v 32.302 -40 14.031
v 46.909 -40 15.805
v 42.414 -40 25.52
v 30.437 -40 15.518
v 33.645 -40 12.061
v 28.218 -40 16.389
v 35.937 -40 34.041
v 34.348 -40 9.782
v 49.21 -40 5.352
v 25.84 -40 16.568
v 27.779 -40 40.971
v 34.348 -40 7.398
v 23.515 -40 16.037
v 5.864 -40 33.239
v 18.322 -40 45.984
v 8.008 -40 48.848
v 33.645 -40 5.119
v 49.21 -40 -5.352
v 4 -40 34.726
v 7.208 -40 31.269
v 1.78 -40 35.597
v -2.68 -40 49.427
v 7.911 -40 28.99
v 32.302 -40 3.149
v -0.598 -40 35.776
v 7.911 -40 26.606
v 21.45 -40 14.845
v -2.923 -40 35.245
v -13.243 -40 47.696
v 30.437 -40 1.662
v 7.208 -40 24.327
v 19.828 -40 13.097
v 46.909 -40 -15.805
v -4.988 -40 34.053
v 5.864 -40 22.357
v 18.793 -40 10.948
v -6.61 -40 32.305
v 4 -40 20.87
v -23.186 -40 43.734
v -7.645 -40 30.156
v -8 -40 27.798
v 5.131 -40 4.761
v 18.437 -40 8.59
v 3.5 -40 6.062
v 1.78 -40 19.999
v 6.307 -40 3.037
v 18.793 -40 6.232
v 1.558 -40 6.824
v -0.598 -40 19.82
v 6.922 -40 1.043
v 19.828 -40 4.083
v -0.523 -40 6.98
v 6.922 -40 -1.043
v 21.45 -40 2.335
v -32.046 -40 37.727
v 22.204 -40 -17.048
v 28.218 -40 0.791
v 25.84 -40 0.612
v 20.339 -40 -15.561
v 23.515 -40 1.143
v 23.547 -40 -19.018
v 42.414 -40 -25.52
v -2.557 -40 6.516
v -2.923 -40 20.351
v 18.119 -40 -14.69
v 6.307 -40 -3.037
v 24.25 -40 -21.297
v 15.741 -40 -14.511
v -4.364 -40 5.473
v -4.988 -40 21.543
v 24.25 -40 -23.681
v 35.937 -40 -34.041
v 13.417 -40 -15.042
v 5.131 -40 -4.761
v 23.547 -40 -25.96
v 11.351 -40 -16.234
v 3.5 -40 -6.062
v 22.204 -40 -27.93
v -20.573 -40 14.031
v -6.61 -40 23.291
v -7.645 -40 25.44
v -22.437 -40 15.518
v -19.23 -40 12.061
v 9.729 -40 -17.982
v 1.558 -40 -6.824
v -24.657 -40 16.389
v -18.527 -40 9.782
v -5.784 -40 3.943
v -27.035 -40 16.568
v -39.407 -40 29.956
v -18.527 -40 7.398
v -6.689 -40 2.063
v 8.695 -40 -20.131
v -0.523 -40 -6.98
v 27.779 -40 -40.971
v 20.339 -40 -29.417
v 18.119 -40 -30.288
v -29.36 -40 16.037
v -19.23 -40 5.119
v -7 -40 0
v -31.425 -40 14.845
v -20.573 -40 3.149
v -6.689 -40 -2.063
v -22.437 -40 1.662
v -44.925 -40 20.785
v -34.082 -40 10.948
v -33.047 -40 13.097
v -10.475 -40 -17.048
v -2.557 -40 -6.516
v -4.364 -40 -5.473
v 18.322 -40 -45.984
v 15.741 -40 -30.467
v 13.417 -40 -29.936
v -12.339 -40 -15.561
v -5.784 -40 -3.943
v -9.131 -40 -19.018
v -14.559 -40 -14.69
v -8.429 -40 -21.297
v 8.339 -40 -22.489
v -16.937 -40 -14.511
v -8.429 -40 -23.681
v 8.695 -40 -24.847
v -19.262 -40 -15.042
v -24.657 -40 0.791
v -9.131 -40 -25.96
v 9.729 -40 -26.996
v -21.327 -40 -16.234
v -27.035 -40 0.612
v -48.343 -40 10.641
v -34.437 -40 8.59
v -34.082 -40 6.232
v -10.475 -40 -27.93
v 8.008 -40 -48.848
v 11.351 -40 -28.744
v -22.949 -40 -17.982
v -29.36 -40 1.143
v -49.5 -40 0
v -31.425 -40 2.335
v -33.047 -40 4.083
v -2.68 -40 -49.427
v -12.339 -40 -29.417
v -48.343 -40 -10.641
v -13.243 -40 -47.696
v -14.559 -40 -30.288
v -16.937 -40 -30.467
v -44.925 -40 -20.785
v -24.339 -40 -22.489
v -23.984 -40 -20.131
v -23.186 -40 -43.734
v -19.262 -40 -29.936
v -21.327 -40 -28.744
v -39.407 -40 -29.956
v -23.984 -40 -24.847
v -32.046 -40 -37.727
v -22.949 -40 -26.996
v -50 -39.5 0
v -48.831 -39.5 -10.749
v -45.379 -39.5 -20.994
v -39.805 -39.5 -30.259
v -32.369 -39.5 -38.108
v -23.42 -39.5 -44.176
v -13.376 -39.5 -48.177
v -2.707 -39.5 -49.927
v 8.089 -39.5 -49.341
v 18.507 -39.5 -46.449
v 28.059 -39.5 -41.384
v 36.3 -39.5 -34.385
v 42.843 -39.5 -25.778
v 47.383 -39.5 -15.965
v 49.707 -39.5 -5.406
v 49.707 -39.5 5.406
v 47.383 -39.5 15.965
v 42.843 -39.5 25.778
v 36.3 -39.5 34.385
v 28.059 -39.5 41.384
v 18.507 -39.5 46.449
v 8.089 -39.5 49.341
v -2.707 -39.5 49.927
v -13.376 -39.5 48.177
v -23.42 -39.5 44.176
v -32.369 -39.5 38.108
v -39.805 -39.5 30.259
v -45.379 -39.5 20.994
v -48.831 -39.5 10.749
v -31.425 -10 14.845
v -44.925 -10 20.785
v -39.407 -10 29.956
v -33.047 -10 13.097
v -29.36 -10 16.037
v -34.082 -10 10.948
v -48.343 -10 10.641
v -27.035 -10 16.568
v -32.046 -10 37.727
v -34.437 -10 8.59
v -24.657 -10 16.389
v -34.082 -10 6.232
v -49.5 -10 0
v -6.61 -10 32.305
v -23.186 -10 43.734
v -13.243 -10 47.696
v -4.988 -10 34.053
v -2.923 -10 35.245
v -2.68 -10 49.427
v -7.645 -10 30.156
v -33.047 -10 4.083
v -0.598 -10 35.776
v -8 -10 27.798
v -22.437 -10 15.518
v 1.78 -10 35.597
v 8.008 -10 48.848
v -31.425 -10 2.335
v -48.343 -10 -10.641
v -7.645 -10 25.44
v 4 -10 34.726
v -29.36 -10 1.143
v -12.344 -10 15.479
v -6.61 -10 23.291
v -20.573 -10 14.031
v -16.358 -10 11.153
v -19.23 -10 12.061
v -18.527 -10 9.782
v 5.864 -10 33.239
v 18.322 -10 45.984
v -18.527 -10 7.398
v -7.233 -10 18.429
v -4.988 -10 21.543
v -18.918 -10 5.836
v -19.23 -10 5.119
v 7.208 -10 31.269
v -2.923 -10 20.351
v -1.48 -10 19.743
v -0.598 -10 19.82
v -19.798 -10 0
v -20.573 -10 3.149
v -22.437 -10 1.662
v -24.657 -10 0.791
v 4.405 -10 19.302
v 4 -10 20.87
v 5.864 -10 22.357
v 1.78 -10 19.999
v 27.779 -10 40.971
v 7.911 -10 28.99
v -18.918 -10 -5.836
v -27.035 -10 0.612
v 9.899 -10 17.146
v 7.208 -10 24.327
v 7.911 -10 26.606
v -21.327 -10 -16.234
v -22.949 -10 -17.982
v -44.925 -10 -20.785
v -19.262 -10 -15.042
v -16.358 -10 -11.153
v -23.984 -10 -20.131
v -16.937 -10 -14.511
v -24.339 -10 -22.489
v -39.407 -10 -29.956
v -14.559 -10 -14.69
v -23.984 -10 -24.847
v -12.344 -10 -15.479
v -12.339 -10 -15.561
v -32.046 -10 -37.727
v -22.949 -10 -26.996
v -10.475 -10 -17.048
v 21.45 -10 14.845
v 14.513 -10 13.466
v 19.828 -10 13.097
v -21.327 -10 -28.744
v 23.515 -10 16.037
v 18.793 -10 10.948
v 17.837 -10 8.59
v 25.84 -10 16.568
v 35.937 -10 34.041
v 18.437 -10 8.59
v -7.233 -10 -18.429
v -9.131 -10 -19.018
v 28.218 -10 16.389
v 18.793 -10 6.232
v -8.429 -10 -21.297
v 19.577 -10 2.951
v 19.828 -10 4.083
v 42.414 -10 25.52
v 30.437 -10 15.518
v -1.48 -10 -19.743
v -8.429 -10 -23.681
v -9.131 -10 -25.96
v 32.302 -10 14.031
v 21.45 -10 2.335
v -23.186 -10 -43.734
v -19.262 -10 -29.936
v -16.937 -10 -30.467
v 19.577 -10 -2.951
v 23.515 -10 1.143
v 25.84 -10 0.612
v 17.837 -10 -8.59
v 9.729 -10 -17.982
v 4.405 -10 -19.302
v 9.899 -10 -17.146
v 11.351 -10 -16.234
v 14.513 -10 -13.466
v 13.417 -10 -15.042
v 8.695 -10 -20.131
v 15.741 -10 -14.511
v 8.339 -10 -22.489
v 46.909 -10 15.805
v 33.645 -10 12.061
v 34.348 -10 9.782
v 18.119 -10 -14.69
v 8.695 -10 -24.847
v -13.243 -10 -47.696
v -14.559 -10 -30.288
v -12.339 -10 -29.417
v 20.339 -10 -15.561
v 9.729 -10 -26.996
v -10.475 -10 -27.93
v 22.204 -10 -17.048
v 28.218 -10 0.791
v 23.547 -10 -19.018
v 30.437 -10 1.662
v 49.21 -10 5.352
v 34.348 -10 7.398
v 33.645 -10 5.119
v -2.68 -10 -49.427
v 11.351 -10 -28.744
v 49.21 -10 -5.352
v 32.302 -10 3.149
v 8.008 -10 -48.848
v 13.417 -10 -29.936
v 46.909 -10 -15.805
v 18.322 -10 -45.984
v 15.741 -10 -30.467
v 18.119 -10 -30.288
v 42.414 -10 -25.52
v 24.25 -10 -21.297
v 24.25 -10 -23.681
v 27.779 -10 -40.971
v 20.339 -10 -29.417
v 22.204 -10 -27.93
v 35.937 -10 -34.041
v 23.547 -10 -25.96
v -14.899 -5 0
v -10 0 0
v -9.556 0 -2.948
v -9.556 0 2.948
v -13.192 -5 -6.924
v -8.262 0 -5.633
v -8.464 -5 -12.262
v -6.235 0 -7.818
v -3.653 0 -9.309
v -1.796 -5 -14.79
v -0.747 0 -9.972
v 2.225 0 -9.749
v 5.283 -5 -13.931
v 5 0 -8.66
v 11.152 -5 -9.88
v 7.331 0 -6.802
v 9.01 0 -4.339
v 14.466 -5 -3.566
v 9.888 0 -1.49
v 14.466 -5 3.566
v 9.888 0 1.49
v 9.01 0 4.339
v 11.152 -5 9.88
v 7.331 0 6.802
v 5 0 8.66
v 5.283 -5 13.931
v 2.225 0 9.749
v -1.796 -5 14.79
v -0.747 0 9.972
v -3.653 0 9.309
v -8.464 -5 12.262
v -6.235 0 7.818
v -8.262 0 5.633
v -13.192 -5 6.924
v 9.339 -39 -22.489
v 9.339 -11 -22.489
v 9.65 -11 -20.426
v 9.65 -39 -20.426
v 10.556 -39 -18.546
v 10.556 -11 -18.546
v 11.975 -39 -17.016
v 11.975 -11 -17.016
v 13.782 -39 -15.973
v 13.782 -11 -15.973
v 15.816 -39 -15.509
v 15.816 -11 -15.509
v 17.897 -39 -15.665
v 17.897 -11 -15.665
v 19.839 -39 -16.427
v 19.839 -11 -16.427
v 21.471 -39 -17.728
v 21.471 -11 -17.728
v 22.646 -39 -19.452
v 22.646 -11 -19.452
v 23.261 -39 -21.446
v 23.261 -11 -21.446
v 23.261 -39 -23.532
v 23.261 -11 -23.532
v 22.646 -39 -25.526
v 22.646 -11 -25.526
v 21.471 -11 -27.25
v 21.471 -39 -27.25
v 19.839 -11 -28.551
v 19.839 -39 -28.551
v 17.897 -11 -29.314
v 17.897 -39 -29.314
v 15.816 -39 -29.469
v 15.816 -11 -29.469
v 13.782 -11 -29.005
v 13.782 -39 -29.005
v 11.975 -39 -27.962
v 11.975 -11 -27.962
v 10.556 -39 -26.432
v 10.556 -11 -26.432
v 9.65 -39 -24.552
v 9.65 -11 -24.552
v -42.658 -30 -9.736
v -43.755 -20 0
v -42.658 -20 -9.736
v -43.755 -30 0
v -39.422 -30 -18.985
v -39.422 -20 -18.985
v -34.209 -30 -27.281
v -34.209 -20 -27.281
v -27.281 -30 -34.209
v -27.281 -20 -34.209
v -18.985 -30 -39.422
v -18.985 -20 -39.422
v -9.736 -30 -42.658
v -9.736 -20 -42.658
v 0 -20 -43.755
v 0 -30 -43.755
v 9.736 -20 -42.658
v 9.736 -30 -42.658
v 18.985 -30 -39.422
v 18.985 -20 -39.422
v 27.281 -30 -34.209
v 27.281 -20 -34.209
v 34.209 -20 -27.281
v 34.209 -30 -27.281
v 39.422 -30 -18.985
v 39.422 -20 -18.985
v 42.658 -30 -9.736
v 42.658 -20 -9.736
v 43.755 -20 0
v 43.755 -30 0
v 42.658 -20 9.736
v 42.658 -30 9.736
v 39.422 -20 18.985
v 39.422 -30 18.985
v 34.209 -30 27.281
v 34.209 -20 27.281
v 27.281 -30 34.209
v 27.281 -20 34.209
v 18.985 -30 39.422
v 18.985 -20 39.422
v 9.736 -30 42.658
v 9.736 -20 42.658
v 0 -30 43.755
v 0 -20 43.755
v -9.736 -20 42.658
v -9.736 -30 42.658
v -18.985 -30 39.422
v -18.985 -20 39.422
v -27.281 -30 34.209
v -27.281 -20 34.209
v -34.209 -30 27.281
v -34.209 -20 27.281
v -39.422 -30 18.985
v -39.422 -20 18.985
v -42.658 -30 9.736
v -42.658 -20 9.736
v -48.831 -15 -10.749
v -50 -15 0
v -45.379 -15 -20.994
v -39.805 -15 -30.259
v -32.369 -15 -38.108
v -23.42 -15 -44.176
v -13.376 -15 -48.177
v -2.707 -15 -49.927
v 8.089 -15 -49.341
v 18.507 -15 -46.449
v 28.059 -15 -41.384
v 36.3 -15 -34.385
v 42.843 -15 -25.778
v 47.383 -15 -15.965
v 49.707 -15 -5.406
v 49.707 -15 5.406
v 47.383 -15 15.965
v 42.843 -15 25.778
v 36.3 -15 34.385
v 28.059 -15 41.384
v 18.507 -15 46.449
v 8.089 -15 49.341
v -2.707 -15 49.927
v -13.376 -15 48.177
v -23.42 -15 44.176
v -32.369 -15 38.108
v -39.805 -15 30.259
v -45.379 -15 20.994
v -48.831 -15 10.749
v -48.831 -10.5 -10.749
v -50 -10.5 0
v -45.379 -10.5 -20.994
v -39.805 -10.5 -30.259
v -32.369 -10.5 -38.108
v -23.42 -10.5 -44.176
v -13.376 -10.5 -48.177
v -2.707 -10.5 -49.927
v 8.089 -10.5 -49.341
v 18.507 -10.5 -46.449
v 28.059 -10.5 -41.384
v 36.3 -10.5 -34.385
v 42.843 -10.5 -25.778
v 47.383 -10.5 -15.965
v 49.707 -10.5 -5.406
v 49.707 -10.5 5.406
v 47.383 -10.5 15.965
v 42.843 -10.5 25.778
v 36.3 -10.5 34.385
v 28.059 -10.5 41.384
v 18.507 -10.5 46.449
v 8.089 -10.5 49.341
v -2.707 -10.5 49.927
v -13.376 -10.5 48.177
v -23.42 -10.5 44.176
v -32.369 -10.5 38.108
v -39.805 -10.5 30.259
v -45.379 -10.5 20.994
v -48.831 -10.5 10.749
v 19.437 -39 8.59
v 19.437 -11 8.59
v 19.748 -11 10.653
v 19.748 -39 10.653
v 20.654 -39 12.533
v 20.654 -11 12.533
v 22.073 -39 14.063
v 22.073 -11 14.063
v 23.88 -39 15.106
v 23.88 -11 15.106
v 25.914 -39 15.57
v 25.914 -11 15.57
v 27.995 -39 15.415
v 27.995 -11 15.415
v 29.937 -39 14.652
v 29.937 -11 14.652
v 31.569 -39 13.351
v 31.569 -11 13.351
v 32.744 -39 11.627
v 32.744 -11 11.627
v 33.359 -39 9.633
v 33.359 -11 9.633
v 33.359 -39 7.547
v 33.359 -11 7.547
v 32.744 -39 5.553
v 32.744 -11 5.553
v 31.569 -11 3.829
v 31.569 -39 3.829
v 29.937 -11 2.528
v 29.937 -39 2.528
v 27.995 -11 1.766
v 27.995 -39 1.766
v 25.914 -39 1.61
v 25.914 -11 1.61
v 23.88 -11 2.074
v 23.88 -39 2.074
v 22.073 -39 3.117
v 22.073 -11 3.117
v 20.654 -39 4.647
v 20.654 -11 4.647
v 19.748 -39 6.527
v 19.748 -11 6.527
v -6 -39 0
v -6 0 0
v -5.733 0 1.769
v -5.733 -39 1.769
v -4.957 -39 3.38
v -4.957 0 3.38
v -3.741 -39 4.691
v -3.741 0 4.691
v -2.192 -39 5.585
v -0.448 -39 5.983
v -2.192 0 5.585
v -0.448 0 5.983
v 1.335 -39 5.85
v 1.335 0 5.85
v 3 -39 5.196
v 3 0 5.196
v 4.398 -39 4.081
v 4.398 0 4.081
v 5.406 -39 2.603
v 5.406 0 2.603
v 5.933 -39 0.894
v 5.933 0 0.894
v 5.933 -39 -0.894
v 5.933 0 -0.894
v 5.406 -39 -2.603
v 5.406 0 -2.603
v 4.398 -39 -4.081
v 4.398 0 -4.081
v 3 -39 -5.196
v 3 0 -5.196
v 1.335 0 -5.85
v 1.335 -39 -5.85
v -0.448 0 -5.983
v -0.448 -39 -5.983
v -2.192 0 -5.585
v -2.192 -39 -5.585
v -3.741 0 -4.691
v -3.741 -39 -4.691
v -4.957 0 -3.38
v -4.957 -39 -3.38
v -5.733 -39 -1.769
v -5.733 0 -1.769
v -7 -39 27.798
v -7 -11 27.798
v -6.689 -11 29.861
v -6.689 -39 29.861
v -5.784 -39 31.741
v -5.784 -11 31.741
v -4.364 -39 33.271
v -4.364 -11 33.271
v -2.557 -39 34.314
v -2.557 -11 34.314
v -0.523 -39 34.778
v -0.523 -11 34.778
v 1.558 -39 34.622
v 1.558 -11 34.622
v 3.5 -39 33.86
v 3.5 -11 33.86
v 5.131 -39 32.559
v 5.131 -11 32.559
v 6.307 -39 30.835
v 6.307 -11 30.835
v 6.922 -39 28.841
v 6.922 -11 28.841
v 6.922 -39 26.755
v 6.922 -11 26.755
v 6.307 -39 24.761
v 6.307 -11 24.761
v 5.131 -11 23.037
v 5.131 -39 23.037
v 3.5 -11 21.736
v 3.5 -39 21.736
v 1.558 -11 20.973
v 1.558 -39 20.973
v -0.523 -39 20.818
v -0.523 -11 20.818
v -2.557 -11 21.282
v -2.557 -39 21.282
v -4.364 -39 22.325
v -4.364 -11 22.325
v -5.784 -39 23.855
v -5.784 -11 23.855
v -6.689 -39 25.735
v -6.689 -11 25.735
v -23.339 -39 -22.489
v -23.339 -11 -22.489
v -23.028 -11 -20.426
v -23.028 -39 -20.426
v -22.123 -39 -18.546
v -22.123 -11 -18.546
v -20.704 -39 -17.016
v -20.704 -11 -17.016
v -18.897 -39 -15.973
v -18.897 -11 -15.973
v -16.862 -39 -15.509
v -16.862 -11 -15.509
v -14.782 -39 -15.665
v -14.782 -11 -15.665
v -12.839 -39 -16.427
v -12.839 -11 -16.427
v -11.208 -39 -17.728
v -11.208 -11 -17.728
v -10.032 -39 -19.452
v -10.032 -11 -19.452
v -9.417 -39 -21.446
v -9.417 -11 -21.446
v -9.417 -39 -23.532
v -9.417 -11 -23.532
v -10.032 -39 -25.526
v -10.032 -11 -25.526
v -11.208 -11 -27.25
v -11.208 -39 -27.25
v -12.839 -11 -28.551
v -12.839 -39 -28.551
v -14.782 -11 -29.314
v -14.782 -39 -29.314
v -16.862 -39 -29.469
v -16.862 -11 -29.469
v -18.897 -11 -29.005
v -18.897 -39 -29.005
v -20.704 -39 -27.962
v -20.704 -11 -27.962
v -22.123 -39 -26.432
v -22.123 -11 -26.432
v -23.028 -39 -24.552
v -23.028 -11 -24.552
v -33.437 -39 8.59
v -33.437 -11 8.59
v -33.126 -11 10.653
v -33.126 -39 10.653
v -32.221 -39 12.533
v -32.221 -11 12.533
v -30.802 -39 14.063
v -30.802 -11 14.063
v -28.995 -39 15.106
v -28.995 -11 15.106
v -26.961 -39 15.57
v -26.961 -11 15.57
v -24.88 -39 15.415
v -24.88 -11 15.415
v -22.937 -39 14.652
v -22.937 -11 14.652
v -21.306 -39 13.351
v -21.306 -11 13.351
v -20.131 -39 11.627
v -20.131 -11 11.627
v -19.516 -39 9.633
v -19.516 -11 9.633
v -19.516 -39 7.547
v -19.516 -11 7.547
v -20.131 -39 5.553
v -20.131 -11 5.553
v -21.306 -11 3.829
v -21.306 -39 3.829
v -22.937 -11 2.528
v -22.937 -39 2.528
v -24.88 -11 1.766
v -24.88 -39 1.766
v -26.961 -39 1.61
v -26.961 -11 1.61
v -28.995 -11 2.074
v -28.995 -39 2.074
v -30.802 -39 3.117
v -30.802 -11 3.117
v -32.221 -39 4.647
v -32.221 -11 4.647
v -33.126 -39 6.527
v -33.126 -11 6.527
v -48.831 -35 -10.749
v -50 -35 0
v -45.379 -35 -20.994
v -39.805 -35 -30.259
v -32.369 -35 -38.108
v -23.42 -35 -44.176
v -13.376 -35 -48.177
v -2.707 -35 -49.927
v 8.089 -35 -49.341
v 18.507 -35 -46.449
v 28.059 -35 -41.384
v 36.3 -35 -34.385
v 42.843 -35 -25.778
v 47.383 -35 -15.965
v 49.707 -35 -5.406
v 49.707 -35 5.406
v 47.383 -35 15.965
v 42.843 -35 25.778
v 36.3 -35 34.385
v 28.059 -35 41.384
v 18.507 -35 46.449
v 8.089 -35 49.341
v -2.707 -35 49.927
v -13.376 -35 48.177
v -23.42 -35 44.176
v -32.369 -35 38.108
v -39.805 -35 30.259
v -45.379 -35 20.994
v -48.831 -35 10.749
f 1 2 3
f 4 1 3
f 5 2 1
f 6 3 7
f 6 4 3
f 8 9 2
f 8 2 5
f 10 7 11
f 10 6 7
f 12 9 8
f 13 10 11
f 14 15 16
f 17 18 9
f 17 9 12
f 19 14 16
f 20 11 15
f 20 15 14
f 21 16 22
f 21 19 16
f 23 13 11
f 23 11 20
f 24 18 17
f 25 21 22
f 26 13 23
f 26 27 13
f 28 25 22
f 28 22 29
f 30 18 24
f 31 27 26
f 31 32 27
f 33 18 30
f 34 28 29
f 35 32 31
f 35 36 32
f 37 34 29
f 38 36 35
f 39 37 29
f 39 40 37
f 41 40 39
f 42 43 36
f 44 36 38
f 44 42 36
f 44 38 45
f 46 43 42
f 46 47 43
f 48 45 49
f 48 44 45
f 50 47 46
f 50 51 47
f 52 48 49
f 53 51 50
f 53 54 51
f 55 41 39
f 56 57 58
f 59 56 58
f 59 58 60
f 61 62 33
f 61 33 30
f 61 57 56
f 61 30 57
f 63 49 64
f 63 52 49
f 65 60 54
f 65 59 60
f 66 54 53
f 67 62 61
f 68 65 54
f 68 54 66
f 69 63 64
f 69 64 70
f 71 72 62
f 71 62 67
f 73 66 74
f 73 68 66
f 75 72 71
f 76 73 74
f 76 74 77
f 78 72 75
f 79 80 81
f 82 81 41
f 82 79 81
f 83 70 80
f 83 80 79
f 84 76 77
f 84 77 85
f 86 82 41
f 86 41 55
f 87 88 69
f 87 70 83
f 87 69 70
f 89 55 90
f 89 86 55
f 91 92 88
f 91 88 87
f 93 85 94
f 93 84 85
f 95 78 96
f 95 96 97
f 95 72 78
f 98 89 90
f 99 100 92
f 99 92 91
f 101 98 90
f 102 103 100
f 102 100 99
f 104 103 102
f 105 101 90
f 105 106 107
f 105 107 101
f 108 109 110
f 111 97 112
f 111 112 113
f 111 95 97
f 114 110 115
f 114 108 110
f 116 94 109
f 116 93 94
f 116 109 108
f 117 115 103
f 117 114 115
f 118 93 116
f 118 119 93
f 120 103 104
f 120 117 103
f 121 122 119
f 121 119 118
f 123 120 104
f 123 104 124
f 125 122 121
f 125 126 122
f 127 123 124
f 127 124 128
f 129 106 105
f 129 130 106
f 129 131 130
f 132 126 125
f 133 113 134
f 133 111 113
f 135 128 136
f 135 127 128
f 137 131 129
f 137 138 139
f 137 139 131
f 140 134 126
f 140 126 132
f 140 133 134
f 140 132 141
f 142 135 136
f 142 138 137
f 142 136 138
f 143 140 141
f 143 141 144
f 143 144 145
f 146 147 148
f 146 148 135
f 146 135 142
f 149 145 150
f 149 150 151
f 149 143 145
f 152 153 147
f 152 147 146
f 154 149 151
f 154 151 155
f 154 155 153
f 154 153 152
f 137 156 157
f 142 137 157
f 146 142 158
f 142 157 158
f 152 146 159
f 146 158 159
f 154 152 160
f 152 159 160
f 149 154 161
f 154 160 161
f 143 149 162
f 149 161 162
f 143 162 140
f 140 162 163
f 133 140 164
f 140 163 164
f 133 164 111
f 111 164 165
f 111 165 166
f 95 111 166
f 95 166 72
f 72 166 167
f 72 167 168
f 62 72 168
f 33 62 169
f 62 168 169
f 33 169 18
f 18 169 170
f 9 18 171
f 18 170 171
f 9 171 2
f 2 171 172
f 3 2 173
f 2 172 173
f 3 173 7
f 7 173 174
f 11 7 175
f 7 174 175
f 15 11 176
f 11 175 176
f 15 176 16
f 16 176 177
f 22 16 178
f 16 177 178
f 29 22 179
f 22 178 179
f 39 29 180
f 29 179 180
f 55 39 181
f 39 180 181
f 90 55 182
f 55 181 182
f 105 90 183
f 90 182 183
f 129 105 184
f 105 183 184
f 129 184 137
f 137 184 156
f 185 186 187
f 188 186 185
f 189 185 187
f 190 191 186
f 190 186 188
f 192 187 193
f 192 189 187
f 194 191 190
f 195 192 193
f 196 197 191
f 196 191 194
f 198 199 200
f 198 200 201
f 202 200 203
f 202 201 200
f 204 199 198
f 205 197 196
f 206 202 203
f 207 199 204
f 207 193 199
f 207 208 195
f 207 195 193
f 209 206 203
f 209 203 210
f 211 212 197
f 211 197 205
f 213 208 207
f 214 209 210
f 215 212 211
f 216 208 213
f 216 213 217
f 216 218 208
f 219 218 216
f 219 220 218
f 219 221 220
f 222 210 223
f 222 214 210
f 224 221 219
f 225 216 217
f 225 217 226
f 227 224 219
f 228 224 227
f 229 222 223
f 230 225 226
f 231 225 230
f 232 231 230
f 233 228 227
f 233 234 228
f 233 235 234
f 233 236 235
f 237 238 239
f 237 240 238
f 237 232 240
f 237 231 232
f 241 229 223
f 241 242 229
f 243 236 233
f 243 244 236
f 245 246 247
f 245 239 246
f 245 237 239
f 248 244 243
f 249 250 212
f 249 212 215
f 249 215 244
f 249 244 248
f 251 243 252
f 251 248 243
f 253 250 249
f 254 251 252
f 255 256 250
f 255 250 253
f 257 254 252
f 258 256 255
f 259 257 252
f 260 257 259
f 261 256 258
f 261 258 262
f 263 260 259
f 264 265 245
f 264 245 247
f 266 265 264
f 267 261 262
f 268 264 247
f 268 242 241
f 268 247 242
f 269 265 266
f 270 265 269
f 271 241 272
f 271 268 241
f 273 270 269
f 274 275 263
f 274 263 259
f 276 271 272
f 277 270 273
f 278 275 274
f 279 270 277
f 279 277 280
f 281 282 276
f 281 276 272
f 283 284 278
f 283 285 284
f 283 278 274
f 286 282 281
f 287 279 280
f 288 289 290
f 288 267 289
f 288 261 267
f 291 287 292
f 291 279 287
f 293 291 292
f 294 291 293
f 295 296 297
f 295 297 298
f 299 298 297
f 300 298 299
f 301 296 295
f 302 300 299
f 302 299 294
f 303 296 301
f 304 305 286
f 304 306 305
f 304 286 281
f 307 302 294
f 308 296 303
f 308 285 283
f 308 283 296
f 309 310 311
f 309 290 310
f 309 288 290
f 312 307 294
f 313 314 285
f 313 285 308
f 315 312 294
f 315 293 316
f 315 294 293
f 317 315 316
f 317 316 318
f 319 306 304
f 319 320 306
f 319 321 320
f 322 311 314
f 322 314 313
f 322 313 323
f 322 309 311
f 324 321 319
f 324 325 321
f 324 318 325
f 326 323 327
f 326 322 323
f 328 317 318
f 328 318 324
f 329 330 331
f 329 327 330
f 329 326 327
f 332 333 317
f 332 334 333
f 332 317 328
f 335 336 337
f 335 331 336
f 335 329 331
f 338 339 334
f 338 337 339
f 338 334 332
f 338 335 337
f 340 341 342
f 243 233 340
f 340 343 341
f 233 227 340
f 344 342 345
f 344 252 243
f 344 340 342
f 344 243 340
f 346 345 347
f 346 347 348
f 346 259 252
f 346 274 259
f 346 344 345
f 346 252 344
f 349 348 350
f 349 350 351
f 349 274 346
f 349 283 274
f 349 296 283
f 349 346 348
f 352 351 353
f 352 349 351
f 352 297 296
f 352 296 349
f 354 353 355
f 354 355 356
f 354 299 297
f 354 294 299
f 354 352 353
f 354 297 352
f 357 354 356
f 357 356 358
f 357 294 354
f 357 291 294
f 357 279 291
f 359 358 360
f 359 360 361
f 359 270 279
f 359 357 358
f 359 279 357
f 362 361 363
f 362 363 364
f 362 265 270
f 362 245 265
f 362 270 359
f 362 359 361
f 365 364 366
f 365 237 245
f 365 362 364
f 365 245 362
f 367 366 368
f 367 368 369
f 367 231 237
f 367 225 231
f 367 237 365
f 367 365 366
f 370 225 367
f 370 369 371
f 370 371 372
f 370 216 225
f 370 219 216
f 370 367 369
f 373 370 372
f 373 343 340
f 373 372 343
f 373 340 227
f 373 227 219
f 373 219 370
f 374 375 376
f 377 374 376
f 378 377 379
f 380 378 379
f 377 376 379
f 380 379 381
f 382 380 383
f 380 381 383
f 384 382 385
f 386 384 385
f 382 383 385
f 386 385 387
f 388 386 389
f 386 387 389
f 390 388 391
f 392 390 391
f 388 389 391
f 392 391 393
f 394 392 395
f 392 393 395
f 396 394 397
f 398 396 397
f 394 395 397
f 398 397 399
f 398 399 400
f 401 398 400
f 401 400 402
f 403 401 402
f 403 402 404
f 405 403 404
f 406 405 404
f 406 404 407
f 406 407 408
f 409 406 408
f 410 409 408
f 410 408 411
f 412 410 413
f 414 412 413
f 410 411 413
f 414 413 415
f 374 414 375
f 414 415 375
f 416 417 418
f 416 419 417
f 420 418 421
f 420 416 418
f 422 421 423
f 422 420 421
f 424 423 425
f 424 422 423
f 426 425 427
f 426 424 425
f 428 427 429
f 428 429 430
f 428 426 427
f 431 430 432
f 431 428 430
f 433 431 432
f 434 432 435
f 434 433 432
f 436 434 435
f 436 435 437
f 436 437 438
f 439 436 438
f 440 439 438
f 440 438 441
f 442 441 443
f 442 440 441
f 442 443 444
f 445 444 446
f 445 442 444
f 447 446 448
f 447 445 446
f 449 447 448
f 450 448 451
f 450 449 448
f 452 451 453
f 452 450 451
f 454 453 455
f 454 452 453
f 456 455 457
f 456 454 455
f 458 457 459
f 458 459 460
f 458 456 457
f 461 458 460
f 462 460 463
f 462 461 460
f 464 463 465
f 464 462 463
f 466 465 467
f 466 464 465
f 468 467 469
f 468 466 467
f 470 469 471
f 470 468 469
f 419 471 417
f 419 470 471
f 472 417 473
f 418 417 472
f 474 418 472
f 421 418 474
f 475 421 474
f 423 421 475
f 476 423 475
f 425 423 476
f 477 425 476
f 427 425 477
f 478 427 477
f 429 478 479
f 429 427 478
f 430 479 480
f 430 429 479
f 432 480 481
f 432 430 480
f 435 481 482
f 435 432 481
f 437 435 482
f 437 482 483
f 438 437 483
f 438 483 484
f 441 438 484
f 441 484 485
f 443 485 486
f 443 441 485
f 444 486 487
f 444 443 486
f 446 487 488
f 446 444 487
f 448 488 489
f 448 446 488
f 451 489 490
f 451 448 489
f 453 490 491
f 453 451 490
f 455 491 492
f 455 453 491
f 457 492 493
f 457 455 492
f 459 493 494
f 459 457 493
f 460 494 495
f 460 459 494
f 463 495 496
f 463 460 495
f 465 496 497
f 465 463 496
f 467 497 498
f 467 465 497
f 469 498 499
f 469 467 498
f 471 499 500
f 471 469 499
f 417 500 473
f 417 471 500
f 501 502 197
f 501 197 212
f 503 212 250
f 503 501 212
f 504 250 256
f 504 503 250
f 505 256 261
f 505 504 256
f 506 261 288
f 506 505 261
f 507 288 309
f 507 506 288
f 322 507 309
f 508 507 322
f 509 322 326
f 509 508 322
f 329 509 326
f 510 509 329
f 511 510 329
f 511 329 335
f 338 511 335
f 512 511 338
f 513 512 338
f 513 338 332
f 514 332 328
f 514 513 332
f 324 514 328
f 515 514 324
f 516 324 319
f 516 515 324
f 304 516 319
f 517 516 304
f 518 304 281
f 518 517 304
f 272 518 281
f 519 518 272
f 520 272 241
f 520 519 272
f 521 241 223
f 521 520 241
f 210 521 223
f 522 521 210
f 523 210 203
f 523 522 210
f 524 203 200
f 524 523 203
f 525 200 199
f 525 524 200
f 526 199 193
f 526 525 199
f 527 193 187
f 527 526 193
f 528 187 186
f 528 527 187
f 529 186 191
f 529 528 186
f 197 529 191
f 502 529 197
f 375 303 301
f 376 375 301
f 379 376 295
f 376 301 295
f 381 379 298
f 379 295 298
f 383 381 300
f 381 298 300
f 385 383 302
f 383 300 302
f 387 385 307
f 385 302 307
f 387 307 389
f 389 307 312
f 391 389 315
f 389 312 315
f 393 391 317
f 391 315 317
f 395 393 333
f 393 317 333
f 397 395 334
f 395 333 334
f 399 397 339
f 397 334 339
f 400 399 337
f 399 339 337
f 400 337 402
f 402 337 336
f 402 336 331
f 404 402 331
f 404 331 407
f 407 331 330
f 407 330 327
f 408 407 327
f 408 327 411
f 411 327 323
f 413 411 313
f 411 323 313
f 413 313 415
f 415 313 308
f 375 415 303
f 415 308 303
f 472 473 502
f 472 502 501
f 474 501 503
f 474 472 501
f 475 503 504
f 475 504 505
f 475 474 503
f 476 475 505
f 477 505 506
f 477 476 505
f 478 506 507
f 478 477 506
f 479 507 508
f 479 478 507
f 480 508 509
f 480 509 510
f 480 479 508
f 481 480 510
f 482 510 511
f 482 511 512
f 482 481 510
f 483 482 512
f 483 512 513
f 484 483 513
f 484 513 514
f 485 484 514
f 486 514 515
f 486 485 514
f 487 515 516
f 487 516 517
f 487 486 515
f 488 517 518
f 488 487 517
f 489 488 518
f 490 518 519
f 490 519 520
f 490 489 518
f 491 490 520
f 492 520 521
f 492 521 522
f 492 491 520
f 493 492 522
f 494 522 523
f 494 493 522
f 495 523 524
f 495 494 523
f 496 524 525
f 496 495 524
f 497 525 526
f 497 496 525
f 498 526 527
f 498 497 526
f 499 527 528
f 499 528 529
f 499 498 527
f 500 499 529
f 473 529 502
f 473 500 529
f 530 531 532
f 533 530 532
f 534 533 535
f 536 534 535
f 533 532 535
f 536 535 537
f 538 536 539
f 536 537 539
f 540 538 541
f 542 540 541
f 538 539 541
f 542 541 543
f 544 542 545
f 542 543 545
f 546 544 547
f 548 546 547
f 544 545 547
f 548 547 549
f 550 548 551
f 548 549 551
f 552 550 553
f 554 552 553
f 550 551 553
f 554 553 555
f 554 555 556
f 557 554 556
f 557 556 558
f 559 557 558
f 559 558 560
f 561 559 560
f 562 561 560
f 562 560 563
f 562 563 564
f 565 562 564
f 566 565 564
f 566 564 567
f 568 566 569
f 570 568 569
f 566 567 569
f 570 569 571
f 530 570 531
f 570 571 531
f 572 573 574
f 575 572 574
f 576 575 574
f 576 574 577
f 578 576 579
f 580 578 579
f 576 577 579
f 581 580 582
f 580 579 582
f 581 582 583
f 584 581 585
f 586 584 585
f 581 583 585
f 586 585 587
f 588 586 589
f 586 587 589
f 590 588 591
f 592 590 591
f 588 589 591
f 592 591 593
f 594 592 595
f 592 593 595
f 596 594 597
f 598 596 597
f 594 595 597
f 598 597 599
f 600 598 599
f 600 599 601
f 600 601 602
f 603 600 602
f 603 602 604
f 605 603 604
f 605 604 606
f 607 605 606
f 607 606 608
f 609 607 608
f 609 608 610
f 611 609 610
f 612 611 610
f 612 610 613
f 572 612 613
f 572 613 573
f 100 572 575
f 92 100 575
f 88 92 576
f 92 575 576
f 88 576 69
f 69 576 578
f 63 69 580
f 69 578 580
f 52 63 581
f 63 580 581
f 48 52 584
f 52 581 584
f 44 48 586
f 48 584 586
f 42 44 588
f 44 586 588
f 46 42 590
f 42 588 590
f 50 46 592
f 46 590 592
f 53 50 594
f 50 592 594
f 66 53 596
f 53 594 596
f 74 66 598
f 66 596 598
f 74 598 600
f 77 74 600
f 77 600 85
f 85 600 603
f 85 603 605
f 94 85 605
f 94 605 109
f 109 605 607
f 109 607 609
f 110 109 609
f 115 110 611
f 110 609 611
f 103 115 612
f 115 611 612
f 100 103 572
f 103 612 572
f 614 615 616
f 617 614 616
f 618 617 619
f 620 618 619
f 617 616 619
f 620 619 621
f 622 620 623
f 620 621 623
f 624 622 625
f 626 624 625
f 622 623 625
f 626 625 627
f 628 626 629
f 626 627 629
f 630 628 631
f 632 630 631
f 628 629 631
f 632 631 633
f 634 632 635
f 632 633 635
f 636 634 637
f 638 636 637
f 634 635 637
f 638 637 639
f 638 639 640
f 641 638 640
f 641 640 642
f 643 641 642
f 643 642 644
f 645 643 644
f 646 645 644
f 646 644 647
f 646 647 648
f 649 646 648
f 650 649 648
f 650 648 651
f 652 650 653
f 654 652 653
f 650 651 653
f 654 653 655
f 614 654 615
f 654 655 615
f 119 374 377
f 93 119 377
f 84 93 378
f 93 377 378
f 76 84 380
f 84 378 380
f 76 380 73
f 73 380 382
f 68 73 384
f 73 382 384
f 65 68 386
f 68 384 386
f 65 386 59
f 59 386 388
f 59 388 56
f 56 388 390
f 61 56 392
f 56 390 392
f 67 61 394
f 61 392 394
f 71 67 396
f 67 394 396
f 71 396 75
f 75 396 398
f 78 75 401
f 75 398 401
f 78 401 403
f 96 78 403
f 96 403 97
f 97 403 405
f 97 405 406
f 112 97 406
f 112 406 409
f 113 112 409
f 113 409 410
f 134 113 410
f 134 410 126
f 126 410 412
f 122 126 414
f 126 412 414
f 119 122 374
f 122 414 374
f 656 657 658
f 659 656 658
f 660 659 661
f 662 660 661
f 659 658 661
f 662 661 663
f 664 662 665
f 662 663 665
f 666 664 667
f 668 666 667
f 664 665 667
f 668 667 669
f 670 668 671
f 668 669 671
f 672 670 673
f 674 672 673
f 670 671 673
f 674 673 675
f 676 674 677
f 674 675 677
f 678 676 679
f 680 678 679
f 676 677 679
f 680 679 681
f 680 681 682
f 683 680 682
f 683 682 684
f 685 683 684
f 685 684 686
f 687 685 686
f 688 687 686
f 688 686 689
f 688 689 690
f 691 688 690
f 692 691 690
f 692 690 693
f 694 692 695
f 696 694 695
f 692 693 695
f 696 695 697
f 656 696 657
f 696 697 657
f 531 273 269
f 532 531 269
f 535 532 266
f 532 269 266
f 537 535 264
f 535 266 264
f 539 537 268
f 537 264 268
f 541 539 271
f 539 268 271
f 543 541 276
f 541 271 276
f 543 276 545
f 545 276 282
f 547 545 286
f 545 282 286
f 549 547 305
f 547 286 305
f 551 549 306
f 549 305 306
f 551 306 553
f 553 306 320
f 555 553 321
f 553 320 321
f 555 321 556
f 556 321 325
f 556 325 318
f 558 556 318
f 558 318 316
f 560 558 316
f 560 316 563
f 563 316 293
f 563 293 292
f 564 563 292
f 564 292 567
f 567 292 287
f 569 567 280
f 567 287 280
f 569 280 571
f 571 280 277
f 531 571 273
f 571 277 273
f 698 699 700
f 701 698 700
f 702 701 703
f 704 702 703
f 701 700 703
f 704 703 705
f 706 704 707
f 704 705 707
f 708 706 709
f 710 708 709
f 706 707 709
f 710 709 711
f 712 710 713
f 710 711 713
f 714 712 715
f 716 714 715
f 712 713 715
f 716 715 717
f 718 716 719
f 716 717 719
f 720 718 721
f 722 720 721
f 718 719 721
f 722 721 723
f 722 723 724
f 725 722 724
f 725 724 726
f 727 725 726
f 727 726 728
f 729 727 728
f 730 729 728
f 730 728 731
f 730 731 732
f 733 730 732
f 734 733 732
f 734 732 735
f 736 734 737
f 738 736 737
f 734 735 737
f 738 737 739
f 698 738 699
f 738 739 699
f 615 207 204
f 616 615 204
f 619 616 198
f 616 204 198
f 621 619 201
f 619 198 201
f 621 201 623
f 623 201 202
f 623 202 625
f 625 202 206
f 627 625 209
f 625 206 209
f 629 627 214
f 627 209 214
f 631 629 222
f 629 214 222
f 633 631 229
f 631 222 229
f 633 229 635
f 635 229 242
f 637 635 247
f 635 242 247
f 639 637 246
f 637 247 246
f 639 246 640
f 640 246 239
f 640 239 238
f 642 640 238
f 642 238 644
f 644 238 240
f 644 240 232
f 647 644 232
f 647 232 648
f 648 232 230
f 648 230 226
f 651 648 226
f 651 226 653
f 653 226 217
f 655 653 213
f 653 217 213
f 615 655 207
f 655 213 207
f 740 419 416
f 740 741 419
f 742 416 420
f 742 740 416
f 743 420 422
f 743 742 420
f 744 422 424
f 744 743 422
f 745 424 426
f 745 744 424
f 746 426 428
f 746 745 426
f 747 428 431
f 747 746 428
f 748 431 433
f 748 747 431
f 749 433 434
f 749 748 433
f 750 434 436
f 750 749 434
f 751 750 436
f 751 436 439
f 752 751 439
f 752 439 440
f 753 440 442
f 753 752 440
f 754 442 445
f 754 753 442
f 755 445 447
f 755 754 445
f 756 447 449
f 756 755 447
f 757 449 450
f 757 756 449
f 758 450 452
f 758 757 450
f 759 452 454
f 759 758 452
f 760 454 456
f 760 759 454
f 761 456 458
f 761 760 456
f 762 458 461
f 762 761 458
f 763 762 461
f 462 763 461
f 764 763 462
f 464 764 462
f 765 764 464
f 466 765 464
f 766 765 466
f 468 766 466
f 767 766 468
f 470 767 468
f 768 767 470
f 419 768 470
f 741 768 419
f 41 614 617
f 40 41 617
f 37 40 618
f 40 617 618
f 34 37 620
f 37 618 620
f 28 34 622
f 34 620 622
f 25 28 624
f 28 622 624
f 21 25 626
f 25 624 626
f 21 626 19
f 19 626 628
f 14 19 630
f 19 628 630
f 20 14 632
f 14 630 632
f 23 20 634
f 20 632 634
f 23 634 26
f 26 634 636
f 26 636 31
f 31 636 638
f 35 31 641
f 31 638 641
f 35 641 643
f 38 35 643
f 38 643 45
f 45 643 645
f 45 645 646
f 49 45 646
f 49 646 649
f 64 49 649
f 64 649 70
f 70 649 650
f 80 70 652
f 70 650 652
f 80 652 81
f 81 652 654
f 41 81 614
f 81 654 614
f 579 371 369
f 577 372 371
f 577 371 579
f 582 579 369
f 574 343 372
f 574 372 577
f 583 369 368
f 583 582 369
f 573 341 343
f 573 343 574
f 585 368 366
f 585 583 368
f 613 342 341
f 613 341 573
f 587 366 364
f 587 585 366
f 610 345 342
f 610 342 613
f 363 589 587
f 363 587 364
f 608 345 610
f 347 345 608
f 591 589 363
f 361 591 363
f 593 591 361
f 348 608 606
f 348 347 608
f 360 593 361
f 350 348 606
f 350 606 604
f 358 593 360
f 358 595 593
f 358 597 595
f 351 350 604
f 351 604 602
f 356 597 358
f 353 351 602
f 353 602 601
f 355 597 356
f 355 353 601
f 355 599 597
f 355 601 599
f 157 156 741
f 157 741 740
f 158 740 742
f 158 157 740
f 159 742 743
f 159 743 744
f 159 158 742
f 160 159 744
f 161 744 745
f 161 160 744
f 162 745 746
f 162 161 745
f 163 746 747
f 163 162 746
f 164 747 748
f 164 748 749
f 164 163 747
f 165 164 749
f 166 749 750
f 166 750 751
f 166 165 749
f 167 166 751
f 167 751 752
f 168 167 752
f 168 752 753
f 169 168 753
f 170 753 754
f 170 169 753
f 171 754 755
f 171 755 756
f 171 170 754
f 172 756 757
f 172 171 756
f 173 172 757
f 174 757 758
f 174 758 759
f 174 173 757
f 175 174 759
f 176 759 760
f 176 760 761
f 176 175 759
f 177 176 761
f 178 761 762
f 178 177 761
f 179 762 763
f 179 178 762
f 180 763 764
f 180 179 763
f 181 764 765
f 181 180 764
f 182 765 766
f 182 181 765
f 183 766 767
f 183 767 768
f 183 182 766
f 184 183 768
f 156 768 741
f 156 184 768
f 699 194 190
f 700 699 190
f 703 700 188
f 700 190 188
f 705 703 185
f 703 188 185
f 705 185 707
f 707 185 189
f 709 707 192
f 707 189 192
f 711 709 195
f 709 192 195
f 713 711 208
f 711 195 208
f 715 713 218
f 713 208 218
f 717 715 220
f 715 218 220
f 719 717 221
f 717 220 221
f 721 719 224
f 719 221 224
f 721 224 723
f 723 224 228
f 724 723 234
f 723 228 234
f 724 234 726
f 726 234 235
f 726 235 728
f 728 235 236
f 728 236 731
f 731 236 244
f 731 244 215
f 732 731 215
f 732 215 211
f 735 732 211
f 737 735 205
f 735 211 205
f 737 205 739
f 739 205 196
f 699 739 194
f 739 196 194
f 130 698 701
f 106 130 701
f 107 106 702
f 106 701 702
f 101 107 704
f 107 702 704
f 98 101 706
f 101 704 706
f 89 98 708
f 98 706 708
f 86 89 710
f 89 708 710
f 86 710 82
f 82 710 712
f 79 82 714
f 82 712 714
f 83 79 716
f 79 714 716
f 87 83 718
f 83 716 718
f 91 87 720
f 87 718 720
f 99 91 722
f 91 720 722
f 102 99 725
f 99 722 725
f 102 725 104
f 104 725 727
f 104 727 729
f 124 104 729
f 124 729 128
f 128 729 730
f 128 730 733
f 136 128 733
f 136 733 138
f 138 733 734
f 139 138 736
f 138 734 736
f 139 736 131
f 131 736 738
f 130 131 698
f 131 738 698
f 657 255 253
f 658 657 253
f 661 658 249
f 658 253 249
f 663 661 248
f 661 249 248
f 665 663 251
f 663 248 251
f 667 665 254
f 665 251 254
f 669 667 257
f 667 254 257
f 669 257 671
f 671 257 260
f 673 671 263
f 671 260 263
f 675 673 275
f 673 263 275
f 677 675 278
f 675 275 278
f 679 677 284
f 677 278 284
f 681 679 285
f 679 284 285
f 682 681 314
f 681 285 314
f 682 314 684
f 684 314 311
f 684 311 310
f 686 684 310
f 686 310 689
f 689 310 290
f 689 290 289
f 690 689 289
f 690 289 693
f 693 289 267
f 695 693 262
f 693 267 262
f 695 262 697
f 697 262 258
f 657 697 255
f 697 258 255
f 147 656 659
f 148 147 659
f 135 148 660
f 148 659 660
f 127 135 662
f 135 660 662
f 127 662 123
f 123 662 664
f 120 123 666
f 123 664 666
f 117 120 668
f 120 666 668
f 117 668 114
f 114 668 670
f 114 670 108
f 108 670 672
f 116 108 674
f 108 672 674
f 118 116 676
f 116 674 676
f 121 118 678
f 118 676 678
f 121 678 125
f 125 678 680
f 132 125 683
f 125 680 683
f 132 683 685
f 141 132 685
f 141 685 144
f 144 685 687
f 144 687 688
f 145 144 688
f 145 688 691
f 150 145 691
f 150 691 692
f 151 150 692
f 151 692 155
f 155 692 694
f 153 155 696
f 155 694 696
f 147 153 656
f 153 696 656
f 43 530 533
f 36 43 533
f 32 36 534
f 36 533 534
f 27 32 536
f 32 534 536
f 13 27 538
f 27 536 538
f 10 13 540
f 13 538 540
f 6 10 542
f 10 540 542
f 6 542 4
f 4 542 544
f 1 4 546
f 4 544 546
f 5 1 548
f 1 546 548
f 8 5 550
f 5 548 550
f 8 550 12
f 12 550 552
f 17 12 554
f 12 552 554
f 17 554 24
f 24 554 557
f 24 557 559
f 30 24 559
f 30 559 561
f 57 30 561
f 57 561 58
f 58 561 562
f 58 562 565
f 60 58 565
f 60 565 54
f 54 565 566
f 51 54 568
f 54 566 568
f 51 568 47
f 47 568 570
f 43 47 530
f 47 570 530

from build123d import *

# Parameters (mm, degrees)
F2_R     = 6
F3_DEPTH = 40.001
F4_R     = 7
F5_DEPTH = 30
F6_SIZE  = 0.5
F7_SIZE  = 0.99999


# Not quite as in the source:
# - a fillet or chamfer is up to 0.001 mm smaller than in the source, because OpenCascade refuses the exact size


with BuildPart() as f1:
    # F0 (on Top) → F1 (revolve)
    with BuildSketch(Plane.XY):
        Polygon((-50, -40), (0, -40), (0, 0), (-10, 0), (-19.7979589711, -10), (-50, -10), (-50, -15), (-43.7550020016, -20), (-43.7550020016, -30), (-50, -35), align=None)
    revolve(axis=Axis((0, -20, 0), (0, -1, 0)))

    # F2 (on face) → F3 (cut, through all)
    with BuildSketch(Plane(origin=(0, 0, 0), x_dir=(-1, 0, 0), z_dir=(0, 1, 0))):
        Circle(F2_R)
    extrude(amount=-F3_DEPTH, mode=Mode.SUBTRACT)

    # F4 (on face) → F5 (cut)
    with BuildSketch(Plane(origin=(0, -10, 0), x_dir=(-1, 0, 0), z_dir=(0, 1, 0))):
        with Locations((0, 27.7979589711)):
            Circle(F4_R)
        with Locations((26.4374300192, 8.590041731)):
            Circle(F4_R)
        with Locations((16.3392303271, -22.4890212166)):
            Circle(F4_R)
        with Locations((-16.3392303271, -22.4890212166)):
            Circle(F4_R)
        with Locations((-26.4374300192, 8.590041731)):
            Circle(F4_R)
    extrude(amount=-F5_DEPTH, mode=Mode.SUBTRACT)

    # F6
    f6_edges = [f1.edges().sort_by_distance(p)[0] for p in [
        (50, -40, 0),
        (50, -10, 0),
    ]]
    chamfer(f6_edges, length=F6_SIZE)

    # F7 (size 1 in the source; OpenCascade refuses exactly that, so slightly less here)
    f7_edges = [f1.edges().sort_by_distance(p)[0] for p in [
        (7, -10, 27.797959),
        (-19.43743, -10, 8.590042),
        (-9.33923, -10, -22.489021),
        (23.33923, -10, -22.489021),
        (33.43743, -10, 8.590042),
        (-9.33923, -40, -22.489021),
        (-19.43743, -40, 8.590042),
        (33.43743, -40, 8.590042),
        (23.33923, -40, -22.489021),
        (6, -40, 0),
        (7, -40, 27.797959),
    ]]
    chamfer(f7_edges, length=F7_SIZE)


solid = f1.part
